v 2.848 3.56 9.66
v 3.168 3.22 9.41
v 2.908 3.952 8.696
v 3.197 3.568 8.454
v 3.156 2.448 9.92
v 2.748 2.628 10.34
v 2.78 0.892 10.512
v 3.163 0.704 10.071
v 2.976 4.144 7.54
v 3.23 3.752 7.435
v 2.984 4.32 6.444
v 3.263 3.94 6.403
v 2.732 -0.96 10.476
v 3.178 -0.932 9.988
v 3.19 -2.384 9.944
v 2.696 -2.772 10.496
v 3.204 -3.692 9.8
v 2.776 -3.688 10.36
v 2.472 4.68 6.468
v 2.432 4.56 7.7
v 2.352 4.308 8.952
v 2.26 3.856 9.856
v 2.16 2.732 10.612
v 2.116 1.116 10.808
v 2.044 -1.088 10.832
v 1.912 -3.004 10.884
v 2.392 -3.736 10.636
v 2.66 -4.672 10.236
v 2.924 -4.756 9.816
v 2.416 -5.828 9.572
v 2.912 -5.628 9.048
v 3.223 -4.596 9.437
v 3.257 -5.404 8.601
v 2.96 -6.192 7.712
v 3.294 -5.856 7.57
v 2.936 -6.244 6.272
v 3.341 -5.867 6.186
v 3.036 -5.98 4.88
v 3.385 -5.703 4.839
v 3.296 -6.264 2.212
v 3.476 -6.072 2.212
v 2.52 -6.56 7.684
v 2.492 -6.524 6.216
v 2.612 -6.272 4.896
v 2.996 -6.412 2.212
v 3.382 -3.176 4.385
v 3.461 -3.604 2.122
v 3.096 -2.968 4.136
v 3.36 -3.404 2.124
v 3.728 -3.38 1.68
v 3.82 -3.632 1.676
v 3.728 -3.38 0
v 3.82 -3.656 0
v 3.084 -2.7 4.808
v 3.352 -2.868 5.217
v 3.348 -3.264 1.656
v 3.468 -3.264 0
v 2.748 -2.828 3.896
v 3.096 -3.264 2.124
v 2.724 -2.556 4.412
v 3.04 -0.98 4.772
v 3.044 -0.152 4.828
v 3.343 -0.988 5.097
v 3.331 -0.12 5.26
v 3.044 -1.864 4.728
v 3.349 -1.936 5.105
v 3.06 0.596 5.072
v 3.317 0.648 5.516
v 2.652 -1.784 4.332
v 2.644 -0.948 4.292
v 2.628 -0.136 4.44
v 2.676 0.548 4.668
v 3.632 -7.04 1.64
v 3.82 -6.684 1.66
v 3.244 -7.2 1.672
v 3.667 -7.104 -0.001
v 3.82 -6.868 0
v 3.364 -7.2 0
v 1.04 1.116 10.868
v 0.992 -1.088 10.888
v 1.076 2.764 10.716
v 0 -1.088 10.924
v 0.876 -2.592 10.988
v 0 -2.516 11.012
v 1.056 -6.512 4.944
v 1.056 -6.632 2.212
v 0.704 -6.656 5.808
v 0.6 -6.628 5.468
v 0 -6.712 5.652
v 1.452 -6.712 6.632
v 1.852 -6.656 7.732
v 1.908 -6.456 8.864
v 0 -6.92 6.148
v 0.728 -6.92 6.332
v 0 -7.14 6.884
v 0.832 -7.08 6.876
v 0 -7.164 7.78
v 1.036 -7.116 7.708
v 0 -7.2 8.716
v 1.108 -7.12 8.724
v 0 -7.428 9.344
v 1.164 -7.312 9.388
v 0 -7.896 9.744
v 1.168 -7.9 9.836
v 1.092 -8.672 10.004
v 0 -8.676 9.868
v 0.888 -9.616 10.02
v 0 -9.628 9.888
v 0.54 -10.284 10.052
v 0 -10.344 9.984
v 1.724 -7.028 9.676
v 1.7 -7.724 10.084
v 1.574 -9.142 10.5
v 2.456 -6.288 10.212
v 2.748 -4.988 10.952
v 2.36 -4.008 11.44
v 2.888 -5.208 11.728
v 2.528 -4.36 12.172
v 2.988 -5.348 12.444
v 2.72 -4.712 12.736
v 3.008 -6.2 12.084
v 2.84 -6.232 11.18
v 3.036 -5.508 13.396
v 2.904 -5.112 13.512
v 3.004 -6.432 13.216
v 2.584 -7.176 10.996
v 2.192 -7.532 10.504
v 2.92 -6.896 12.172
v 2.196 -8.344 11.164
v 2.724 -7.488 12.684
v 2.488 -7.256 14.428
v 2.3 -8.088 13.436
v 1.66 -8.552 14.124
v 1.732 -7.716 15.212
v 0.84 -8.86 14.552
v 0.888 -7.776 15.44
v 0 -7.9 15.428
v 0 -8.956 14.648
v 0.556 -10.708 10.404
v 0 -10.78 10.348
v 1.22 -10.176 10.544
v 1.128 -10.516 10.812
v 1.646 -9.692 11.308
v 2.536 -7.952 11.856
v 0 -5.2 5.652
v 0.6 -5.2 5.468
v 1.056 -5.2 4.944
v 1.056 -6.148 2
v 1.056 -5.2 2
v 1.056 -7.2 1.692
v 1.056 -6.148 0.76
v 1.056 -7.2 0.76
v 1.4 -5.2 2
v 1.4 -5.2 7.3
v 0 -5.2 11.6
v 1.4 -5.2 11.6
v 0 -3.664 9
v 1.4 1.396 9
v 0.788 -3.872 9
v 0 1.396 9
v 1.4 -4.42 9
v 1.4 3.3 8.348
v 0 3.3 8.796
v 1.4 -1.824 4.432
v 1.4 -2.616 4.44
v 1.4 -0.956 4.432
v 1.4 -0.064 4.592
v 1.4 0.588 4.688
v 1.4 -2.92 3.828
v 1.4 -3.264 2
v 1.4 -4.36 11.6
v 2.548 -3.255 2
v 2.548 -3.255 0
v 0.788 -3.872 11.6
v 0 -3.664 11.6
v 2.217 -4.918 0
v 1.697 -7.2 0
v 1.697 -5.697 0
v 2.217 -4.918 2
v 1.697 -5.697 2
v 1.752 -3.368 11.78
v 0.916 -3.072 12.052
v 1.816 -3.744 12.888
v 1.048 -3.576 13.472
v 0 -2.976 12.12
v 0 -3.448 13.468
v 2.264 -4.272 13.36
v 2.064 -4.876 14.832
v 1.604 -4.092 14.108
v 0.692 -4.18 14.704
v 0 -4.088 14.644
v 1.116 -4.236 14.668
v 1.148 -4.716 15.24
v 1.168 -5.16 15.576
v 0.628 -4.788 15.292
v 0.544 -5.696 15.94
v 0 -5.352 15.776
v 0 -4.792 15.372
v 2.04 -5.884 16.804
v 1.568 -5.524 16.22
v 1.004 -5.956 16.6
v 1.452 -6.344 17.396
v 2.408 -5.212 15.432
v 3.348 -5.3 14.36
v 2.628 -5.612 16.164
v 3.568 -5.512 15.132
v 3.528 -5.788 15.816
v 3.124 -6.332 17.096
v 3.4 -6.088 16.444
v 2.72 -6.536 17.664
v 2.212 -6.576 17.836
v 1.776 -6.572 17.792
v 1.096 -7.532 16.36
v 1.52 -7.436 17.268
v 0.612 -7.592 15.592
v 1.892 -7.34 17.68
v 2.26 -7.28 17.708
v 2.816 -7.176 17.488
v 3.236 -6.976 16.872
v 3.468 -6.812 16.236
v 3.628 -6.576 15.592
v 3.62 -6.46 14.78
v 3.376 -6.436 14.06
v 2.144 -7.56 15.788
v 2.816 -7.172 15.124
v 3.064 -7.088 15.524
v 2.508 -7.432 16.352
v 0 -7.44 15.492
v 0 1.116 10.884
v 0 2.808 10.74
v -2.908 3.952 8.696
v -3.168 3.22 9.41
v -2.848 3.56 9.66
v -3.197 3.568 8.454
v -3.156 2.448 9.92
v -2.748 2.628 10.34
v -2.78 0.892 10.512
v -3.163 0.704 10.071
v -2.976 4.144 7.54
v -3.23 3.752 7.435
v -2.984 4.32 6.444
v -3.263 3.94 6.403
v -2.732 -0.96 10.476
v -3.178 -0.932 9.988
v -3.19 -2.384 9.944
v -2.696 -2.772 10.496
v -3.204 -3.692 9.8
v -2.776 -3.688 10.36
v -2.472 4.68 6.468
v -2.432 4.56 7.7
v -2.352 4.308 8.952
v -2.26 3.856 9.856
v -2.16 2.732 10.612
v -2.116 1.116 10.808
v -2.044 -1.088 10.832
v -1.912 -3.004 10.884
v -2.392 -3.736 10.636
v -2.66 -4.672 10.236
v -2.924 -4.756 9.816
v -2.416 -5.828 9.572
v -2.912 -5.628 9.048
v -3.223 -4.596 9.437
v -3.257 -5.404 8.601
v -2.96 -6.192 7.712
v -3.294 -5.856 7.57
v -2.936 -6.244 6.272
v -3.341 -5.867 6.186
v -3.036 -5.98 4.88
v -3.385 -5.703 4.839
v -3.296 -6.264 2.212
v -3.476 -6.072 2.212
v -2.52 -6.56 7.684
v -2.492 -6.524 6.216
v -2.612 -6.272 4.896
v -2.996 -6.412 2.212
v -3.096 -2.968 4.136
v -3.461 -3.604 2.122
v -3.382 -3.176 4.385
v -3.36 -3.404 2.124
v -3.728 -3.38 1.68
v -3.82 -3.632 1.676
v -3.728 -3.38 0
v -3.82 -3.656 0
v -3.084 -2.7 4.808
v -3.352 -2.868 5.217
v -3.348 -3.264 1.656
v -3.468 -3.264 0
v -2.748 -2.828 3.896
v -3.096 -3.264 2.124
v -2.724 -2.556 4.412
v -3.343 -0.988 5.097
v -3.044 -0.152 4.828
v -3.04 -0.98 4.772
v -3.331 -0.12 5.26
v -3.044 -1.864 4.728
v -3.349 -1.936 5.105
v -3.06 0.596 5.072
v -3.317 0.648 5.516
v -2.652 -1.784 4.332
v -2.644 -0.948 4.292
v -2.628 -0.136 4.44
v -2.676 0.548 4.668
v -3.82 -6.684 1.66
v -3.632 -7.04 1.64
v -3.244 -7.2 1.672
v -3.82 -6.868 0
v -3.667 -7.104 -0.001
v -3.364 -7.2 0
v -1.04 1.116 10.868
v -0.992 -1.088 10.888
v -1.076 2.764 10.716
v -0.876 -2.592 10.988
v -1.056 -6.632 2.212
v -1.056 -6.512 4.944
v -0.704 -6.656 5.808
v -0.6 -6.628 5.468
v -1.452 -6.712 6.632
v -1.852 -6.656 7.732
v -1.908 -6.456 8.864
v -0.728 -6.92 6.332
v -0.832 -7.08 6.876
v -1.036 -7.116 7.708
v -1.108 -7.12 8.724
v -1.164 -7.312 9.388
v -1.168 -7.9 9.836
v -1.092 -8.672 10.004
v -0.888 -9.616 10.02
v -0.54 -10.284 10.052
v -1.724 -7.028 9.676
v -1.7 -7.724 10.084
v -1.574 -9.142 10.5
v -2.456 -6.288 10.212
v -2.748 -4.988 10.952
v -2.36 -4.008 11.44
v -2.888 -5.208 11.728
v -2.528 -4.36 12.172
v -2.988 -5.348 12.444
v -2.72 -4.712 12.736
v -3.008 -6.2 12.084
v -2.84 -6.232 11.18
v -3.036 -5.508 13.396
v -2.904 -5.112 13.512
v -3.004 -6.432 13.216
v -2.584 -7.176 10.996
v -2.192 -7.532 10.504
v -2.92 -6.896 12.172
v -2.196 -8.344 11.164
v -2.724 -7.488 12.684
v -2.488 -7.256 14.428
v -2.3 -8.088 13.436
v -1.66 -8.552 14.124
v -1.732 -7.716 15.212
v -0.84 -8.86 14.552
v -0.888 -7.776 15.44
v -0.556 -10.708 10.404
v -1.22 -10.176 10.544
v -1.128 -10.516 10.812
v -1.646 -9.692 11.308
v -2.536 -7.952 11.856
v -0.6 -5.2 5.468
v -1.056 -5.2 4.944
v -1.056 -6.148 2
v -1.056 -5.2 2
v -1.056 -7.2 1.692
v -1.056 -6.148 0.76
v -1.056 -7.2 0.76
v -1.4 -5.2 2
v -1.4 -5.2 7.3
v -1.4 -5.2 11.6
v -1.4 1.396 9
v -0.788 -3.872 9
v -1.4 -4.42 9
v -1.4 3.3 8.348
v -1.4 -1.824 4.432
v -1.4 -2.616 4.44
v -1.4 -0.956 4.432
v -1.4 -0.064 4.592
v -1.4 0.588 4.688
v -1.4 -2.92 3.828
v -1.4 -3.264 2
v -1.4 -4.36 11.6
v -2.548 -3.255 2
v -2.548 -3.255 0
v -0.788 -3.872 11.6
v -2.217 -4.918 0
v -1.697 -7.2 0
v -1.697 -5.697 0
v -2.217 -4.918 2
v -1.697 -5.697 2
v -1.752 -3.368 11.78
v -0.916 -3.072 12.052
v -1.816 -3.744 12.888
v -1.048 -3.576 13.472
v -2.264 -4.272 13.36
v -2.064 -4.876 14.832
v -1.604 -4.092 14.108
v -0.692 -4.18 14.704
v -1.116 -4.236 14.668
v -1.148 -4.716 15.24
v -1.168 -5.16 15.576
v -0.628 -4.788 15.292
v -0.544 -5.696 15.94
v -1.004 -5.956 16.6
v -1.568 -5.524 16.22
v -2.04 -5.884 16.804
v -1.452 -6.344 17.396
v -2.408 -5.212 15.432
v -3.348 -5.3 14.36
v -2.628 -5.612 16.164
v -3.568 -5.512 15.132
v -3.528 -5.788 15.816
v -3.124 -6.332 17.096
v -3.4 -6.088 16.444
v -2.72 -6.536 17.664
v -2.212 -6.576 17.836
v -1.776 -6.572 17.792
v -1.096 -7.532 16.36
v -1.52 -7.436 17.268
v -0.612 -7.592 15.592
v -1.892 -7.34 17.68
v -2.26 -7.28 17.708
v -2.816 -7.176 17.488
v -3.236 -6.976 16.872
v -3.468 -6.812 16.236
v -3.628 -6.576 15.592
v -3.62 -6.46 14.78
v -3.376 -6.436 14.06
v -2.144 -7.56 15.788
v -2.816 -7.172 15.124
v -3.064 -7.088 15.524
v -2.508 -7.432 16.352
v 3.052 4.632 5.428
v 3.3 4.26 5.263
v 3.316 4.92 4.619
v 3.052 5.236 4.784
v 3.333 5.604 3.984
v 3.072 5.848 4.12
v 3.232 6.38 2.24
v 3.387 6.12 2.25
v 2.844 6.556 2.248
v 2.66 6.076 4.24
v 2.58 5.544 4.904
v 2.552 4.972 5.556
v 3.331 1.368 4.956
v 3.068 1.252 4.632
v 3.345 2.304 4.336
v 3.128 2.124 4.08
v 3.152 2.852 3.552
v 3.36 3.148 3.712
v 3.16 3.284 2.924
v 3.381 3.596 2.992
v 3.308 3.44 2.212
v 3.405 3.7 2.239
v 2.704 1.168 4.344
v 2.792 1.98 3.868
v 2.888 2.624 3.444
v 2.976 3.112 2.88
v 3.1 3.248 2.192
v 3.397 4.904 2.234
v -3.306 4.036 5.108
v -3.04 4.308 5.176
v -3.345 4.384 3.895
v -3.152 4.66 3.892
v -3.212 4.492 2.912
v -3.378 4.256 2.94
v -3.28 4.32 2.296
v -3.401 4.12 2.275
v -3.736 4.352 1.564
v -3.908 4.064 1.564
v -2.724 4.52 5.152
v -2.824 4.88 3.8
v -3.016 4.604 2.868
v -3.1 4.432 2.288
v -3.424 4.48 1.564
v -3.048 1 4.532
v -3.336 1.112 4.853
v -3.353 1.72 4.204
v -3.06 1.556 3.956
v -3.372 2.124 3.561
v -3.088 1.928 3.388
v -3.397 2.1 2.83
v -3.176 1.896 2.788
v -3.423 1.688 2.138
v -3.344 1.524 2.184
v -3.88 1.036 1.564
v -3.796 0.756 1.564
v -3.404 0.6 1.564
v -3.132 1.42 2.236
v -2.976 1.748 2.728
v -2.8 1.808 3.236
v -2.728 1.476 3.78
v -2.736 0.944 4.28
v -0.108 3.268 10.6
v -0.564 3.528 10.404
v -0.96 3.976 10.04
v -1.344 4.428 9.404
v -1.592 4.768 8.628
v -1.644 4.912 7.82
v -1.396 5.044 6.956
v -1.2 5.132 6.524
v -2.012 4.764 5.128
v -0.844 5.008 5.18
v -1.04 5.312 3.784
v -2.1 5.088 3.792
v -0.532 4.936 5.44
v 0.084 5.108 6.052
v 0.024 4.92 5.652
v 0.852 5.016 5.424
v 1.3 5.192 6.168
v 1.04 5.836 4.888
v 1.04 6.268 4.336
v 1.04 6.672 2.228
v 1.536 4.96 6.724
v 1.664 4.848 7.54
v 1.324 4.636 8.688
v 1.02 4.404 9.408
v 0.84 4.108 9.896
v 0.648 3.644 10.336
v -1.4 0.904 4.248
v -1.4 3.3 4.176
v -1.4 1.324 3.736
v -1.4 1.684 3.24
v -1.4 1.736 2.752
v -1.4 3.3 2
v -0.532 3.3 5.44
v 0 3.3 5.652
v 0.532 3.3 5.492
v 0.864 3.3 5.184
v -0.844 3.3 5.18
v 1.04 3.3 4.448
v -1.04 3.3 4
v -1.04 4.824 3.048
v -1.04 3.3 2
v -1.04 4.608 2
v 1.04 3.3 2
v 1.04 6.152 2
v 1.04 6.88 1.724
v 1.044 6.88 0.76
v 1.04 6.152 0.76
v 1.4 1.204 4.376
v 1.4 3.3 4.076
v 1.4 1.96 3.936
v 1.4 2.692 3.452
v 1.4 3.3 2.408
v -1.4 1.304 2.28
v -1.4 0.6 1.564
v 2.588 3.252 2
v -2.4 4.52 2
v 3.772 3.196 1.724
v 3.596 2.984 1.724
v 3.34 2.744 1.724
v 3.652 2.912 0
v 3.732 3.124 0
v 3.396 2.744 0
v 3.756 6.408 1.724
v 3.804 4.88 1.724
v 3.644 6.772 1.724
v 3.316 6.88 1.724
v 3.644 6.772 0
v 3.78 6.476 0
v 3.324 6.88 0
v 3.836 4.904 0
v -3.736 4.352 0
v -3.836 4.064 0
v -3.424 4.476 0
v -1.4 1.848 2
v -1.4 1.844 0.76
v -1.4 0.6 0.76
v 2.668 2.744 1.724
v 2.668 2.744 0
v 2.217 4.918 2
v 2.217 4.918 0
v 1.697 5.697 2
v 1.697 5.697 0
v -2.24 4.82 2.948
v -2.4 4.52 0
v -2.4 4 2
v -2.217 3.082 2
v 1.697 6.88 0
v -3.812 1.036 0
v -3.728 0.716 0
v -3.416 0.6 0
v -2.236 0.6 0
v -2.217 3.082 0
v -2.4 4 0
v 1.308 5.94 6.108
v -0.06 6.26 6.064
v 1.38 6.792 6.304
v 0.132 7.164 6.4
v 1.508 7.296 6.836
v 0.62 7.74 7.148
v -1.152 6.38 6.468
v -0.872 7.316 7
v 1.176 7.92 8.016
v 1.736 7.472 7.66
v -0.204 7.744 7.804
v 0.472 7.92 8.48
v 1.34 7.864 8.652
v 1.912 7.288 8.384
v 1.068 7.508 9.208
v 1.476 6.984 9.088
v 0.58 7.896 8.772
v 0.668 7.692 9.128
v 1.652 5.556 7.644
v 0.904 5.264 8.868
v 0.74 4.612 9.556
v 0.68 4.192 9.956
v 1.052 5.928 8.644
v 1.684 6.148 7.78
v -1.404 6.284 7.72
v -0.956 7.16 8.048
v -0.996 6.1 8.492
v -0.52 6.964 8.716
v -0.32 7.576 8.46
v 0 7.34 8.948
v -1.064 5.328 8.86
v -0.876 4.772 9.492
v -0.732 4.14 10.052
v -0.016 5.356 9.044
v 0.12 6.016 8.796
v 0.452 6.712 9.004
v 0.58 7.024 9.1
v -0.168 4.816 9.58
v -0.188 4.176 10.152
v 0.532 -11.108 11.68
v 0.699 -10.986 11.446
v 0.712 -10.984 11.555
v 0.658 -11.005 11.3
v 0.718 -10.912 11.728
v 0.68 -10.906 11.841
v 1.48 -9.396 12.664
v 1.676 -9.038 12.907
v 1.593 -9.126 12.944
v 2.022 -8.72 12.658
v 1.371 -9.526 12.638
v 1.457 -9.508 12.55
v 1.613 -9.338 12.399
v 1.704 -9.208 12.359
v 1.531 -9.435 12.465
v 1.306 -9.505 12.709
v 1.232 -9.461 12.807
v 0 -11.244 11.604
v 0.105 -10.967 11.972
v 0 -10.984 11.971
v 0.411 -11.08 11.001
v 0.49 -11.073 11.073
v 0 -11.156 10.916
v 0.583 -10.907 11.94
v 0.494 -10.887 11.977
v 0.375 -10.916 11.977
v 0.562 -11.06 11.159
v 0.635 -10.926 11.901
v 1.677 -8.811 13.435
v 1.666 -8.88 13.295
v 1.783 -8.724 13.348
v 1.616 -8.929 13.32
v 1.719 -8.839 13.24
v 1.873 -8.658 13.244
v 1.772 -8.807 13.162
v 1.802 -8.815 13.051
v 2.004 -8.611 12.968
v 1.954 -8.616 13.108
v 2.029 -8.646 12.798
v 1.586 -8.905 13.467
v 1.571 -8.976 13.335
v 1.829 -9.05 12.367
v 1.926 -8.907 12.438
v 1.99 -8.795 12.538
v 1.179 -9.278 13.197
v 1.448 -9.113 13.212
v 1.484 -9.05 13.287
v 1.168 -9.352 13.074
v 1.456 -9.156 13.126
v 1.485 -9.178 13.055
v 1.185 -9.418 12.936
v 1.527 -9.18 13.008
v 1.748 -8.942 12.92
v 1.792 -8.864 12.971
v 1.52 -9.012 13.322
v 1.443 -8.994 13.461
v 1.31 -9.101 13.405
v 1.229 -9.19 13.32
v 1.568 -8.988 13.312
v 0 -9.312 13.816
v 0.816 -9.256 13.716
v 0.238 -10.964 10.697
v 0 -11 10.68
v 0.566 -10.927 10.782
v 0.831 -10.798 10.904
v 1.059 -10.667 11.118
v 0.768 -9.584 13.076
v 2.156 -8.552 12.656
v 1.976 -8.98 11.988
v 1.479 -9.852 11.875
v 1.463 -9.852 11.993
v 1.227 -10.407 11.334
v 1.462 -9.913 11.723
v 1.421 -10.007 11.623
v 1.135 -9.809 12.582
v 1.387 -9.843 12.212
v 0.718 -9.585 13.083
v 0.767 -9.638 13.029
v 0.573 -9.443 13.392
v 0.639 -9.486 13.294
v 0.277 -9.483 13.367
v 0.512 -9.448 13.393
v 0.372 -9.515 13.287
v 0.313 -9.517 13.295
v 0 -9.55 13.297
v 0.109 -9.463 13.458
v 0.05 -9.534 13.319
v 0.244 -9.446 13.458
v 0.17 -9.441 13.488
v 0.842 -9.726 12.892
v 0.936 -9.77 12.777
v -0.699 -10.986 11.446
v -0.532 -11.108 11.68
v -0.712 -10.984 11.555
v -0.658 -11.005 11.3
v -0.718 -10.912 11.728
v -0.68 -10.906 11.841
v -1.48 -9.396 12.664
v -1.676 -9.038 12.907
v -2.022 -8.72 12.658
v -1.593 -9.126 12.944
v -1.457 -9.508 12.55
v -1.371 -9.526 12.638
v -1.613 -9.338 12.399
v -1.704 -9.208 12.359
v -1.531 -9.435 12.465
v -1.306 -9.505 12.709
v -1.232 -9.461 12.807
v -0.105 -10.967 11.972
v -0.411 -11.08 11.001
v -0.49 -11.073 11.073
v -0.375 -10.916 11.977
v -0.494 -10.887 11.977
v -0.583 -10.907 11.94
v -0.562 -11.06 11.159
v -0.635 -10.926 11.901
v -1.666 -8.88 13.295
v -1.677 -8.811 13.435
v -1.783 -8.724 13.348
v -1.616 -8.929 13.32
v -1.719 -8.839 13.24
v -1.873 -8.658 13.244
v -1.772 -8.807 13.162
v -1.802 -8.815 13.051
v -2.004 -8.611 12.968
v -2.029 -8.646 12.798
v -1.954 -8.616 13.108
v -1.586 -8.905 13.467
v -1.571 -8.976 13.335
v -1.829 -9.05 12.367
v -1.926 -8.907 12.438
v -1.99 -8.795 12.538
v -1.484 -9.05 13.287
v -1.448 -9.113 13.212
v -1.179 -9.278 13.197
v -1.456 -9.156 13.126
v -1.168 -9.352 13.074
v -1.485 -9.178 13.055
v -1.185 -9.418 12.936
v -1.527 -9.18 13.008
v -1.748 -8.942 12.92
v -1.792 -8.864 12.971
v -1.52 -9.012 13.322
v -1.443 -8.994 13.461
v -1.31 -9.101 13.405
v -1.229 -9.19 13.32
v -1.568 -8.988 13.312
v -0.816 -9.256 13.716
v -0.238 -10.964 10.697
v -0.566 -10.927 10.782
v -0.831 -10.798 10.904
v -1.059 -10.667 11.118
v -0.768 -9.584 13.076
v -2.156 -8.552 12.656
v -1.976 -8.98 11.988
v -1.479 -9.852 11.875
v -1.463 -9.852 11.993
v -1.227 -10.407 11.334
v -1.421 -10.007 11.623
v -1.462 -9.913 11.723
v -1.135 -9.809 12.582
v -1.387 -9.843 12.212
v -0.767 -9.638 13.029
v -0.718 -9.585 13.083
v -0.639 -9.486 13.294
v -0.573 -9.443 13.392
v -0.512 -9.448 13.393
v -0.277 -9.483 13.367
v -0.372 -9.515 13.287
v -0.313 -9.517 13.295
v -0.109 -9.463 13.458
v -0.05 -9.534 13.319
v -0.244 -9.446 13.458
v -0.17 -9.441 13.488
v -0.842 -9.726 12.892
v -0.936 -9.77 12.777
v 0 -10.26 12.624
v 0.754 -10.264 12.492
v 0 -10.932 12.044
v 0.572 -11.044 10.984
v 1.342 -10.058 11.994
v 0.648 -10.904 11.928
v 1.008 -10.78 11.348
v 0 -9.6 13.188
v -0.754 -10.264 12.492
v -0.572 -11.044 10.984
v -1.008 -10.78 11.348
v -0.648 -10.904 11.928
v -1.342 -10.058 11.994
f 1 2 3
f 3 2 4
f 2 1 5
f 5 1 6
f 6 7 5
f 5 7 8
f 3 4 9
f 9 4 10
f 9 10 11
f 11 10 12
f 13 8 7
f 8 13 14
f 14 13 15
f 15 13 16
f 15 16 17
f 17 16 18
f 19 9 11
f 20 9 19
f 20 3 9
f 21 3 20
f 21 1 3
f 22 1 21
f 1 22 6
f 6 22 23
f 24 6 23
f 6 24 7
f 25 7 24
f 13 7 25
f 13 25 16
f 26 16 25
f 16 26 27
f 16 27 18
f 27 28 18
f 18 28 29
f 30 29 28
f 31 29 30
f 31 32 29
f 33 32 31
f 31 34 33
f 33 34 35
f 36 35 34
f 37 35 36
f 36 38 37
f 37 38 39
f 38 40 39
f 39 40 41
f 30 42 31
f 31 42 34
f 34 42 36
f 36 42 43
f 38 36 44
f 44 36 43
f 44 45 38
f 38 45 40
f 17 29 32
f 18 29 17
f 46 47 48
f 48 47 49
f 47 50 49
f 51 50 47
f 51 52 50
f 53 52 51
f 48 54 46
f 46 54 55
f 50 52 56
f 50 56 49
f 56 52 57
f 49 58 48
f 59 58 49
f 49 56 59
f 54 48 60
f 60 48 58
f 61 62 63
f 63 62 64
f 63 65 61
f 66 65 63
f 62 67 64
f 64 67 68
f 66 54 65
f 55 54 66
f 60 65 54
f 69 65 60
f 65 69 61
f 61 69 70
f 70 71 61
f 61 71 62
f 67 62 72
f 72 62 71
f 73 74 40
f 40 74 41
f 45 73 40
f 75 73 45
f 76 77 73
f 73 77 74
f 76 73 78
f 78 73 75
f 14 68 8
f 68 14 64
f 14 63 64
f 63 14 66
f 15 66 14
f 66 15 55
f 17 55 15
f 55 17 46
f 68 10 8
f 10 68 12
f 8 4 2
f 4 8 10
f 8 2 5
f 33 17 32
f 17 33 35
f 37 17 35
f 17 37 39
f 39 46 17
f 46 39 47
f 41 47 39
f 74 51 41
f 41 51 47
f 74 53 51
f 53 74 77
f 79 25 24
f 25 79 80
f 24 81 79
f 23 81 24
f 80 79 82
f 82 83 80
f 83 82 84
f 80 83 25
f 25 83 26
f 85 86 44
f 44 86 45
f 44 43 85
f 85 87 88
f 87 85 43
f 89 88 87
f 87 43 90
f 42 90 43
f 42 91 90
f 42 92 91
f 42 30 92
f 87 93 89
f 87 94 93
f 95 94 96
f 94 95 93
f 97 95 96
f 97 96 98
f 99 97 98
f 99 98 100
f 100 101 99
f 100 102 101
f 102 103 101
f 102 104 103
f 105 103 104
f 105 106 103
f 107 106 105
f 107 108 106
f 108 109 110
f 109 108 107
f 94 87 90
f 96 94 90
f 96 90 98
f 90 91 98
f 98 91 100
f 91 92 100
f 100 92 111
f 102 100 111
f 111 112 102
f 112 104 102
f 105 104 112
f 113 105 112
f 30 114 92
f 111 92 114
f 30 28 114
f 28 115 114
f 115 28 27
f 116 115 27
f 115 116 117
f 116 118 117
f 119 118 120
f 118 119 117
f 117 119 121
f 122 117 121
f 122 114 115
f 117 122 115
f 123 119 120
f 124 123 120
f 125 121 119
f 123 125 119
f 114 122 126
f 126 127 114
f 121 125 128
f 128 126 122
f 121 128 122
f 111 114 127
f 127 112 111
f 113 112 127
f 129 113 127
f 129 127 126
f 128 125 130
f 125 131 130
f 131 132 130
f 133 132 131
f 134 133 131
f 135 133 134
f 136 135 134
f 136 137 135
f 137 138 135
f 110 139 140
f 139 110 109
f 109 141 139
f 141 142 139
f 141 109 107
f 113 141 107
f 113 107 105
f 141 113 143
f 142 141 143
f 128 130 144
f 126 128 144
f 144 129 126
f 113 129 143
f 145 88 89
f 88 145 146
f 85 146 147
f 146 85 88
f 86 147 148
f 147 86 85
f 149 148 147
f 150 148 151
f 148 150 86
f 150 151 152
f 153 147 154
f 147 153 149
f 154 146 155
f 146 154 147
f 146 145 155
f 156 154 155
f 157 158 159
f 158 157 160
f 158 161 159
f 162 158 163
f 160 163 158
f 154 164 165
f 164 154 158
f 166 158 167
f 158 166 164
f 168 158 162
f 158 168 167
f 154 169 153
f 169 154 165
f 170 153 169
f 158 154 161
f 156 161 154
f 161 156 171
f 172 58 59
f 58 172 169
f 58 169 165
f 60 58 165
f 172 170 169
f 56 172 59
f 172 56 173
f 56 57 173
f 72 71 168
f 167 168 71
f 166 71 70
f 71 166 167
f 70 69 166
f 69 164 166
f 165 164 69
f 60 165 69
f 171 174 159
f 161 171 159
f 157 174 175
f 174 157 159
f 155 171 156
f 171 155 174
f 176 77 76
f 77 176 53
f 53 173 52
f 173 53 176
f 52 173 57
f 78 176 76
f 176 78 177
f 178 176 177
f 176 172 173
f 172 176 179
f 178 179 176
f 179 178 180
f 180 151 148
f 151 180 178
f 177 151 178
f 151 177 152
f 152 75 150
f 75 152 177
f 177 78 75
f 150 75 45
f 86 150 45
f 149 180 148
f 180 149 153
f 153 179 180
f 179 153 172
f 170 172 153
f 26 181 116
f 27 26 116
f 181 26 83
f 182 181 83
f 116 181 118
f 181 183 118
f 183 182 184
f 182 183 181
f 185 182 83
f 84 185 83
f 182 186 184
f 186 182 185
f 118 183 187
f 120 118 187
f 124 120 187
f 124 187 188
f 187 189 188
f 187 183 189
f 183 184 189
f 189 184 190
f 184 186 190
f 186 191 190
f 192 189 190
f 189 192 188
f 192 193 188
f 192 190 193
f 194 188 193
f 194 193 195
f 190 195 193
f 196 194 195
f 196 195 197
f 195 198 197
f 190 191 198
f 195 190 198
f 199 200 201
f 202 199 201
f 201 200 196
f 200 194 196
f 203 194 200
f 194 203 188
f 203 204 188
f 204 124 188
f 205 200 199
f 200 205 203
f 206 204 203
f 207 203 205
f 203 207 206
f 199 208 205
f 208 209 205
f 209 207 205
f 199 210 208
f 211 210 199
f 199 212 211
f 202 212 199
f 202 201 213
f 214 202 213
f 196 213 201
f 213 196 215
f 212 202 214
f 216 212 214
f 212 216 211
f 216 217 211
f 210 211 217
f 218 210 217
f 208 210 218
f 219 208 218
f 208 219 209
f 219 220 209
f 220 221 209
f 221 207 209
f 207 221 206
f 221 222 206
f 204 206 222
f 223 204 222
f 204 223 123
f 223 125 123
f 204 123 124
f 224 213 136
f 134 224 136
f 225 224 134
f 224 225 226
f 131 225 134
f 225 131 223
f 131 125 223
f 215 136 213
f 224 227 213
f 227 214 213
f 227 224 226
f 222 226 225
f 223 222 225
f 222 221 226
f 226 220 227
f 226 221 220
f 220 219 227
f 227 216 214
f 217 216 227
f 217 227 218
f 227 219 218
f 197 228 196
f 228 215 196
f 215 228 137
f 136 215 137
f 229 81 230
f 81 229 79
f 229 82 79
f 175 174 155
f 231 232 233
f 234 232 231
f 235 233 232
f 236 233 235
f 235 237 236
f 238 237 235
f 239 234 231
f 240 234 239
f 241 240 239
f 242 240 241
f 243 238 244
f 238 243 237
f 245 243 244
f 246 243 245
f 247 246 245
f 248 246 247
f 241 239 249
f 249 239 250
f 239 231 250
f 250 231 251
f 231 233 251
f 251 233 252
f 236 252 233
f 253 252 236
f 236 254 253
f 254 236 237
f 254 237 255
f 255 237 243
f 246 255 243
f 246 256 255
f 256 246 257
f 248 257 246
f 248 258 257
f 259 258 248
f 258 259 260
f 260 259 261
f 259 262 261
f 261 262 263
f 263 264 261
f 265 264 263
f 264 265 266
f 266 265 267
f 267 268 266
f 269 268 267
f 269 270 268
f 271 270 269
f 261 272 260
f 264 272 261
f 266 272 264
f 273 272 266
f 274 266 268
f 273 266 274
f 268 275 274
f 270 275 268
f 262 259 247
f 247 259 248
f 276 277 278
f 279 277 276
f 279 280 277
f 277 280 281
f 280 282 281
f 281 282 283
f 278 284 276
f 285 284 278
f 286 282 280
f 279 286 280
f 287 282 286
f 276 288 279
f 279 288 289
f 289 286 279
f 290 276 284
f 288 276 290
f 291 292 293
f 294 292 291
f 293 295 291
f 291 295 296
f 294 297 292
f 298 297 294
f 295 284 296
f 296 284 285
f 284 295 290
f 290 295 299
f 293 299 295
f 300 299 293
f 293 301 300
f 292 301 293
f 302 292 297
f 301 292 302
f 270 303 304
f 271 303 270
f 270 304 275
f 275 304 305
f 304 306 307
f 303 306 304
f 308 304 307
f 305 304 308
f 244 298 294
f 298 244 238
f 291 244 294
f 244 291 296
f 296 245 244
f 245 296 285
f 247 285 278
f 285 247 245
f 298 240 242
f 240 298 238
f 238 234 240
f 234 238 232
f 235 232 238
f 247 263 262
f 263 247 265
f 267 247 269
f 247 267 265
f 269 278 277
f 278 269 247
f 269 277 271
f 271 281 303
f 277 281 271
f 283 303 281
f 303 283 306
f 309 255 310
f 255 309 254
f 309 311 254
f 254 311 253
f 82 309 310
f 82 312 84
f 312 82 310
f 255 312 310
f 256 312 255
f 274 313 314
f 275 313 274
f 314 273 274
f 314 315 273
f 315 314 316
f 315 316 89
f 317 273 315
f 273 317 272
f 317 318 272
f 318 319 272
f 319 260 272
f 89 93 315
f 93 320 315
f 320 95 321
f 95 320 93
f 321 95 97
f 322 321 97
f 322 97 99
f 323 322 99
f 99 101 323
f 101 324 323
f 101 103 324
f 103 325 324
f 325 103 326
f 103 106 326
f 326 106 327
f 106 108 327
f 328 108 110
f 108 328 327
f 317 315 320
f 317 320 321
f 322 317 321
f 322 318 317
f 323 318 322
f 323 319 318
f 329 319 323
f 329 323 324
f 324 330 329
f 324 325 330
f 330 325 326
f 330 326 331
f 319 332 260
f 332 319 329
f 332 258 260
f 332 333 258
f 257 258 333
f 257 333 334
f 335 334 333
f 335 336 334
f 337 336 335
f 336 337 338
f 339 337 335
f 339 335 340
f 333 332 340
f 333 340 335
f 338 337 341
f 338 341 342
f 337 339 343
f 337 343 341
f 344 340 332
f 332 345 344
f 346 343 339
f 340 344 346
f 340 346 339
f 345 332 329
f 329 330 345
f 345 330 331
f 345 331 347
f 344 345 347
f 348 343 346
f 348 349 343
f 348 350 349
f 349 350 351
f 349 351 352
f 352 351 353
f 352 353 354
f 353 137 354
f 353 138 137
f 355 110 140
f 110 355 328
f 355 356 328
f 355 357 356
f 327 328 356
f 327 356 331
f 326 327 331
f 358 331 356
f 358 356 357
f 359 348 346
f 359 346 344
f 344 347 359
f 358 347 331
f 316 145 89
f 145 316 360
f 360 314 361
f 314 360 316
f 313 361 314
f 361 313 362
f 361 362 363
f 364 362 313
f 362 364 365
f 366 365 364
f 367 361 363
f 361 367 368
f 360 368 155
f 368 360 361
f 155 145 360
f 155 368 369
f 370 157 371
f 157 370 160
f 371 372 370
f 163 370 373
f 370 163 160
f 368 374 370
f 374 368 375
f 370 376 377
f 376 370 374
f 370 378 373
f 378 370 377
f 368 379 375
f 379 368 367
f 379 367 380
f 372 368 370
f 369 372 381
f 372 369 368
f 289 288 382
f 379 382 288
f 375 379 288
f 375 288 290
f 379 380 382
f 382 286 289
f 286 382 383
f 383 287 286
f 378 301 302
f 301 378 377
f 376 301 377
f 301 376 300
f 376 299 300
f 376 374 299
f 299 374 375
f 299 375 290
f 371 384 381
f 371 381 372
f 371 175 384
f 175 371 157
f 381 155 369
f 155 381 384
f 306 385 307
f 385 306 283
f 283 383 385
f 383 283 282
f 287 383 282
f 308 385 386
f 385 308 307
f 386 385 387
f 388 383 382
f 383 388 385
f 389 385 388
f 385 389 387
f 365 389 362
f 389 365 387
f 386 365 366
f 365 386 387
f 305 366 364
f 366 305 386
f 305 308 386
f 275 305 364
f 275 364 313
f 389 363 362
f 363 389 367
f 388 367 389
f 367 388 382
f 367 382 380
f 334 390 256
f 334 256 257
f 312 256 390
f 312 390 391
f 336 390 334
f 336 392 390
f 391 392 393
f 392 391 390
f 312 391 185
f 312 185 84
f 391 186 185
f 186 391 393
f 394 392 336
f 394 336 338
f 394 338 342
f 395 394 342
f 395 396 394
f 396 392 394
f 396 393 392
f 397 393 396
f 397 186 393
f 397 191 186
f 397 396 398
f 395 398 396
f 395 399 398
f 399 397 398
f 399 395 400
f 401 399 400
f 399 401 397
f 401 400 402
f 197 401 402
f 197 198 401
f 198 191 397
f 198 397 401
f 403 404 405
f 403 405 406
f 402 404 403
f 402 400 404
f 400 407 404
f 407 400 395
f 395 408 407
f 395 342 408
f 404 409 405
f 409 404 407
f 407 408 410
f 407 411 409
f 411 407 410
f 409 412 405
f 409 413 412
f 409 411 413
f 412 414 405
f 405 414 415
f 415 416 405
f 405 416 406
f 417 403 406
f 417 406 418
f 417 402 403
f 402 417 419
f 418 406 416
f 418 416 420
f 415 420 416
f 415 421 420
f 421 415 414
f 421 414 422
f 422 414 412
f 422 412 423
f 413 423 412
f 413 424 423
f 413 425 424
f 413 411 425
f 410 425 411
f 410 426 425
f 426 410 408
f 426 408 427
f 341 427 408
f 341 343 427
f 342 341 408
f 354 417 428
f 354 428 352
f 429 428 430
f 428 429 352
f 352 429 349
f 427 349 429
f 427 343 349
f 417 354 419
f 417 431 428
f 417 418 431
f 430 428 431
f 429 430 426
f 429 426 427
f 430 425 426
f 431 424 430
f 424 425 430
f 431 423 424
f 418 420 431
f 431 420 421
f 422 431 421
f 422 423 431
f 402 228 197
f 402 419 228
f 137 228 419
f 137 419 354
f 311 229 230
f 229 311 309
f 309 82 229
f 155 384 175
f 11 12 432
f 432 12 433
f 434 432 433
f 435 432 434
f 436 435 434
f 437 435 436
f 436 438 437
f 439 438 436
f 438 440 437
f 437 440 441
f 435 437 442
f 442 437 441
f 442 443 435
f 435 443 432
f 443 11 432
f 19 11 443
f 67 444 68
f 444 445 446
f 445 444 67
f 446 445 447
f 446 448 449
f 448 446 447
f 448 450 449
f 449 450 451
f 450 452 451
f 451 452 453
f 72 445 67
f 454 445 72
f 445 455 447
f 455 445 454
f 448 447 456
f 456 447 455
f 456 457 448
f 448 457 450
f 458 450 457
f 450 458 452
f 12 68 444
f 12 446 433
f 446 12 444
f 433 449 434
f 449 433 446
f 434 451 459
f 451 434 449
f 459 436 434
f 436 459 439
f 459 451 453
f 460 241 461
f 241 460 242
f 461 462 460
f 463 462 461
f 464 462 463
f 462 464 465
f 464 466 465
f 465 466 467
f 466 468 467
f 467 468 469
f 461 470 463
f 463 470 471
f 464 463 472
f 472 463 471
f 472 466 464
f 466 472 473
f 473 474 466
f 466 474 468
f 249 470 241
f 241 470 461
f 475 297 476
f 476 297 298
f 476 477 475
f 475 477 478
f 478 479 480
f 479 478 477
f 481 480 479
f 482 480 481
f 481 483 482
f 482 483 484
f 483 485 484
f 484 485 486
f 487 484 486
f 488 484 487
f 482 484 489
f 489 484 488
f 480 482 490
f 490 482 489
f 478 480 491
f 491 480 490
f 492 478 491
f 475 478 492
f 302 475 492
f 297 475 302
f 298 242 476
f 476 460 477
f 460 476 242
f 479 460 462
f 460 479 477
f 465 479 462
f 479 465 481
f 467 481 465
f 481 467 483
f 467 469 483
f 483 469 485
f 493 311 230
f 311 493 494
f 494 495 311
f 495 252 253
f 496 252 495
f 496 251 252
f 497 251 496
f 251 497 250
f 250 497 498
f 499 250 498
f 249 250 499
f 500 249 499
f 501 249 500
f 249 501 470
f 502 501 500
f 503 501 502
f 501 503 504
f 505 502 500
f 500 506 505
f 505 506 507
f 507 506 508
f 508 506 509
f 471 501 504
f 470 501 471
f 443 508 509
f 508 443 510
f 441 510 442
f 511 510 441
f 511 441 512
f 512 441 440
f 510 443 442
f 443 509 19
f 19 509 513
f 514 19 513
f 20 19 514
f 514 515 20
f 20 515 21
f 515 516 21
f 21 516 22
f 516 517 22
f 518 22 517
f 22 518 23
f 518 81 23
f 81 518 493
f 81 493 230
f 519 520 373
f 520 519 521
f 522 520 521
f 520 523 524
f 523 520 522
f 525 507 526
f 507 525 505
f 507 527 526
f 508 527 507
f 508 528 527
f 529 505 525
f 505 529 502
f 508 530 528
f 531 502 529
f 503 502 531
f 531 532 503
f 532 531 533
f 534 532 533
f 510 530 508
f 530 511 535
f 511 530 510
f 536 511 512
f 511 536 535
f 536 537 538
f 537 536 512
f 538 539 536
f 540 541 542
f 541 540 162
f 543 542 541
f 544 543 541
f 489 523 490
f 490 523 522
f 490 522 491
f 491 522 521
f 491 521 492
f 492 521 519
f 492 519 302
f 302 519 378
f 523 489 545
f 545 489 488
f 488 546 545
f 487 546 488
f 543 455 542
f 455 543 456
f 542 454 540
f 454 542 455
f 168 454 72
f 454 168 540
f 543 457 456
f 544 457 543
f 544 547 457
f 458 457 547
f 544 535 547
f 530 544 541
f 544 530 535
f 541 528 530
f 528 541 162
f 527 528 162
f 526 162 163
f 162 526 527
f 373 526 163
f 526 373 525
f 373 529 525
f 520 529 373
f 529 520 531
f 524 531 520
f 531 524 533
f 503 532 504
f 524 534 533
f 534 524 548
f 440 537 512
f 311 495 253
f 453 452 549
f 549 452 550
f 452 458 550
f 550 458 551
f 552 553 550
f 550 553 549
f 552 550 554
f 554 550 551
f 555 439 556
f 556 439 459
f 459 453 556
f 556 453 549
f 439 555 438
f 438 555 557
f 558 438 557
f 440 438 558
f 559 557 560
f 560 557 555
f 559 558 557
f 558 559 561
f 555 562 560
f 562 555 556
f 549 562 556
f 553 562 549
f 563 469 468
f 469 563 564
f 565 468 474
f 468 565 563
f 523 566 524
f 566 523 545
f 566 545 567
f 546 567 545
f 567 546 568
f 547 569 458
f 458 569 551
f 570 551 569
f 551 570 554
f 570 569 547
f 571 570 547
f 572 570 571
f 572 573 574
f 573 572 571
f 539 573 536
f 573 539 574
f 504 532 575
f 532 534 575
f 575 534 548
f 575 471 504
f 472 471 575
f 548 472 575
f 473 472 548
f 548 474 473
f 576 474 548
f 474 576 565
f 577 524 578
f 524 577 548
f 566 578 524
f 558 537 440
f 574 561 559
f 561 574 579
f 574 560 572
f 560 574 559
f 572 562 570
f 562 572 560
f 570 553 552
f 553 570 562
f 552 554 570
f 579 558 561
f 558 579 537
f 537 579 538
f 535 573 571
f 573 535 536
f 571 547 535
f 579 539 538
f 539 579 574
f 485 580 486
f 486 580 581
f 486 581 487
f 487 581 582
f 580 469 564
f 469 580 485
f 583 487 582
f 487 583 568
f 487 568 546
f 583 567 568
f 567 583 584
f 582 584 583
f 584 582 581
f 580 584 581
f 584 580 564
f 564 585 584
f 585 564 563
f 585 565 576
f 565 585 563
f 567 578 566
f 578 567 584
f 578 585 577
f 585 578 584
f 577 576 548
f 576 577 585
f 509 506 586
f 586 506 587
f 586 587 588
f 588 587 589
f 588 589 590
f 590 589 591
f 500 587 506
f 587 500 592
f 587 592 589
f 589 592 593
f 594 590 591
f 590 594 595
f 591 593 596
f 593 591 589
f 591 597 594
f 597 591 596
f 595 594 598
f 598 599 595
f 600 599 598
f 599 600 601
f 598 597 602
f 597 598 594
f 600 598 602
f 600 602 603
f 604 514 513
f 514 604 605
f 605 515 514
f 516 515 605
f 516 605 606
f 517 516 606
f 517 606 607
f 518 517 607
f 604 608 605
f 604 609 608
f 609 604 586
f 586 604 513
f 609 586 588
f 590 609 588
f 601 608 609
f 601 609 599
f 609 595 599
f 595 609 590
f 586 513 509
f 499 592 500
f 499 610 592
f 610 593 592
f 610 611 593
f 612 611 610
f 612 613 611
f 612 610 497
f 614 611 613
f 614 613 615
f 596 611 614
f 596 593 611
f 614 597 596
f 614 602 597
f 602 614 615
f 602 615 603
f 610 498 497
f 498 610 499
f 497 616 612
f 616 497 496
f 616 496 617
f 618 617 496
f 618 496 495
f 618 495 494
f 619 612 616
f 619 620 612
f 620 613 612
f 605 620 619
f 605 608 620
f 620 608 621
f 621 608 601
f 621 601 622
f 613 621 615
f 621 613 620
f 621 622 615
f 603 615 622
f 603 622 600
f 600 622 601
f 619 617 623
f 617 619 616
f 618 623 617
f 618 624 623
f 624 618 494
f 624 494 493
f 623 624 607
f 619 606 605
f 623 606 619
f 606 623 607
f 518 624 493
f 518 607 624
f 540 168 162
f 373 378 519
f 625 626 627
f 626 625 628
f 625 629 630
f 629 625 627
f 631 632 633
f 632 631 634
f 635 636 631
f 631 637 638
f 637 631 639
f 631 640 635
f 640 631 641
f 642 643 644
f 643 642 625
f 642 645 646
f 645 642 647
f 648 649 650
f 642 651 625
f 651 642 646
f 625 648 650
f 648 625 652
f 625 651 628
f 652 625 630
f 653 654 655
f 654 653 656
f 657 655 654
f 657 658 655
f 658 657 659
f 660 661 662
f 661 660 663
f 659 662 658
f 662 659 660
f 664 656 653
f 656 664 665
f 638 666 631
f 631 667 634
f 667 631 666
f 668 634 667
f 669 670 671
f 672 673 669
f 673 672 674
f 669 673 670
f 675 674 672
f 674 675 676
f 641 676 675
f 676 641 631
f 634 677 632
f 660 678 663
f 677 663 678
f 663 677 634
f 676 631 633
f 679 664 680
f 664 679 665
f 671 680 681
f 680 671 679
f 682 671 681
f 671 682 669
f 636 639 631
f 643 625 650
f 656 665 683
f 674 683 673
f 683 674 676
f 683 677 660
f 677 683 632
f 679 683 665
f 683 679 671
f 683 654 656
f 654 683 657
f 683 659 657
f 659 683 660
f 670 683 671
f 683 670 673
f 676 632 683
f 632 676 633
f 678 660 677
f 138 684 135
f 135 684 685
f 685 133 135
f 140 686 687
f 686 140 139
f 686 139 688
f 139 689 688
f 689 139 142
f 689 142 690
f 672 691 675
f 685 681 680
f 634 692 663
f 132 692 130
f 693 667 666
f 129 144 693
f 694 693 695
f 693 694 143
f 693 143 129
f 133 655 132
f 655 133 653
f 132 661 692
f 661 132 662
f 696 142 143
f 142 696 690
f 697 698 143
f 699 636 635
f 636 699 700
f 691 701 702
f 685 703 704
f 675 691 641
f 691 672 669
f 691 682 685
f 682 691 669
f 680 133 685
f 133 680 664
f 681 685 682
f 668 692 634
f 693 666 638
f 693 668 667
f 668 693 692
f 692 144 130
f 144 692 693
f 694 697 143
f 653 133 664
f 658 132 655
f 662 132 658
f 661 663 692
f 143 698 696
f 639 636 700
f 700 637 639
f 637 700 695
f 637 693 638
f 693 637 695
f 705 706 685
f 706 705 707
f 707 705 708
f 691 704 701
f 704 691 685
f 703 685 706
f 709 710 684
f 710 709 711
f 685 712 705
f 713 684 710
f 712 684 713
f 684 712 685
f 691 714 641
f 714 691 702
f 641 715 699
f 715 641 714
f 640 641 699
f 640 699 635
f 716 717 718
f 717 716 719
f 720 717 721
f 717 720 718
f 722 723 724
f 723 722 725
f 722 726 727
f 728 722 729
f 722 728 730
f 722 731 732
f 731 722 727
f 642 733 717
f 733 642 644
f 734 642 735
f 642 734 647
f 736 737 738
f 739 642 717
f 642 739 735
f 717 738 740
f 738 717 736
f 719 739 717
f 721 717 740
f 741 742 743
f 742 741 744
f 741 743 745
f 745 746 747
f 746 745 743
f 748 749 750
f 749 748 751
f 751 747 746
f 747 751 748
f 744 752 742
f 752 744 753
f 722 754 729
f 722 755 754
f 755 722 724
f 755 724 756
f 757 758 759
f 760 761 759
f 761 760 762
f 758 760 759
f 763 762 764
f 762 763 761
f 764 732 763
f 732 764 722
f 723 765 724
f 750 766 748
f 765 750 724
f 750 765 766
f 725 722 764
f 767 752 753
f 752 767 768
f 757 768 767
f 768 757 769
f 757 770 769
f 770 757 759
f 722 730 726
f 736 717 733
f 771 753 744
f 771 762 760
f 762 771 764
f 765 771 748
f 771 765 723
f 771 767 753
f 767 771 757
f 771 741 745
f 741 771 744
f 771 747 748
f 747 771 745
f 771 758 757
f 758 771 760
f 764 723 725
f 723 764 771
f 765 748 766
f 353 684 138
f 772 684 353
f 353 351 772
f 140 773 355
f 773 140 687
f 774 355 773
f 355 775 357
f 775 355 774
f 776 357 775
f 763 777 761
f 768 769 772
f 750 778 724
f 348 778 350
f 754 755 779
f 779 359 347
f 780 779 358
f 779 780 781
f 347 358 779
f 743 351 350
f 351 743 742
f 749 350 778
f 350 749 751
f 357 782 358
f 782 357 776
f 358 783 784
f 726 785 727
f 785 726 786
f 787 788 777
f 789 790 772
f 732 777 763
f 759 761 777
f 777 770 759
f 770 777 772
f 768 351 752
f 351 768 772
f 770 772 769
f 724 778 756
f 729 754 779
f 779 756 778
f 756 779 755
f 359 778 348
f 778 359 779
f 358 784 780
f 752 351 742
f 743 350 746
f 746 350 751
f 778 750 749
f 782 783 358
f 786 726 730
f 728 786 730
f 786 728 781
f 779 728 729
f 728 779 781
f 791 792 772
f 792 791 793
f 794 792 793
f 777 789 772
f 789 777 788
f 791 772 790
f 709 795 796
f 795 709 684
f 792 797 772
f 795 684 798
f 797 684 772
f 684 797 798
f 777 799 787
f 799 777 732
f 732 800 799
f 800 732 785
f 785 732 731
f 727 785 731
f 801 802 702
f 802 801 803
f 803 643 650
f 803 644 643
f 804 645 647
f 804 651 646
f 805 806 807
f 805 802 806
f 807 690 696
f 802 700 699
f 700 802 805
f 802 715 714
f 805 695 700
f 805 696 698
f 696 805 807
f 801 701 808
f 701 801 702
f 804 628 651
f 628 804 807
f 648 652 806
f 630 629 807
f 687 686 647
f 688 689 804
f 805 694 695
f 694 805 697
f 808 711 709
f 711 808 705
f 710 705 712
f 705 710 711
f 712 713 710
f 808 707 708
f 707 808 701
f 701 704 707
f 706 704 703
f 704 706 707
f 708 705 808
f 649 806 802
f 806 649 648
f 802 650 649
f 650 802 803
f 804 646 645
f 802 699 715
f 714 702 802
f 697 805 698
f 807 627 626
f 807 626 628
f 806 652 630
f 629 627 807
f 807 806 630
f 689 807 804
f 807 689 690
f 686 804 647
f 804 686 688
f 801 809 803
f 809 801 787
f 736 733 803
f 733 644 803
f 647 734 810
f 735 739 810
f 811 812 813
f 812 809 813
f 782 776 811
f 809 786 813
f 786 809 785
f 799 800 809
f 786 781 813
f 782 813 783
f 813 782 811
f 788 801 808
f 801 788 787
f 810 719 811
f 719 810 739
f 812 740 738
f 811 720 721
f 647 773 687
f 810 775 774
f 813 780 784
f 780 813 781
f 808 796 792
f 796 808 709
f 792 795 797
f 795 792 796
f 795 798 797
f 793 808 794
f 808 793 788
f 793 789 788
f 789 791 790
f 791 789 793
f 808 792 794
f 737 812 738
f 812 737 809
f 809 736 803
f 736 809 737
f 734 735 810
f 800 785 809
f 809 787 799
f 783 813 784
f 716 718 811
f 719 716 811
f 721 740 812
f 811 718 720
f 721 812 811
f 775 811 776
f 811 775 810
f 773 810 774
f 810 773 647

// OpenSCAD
use <../lib.scad>
use <s/2889p01s01.scad>
use <s/2889p01s02.scad>
use <s/2889s01.scad>
function ldraw_lib__2889p01() = [
// 0 Animal Dog Alsatian / German Shepherd Puppy with Black Eyes and Nose and Dark Brown Muzzle Pattern
// 0 Name: 2889p01.dat
// 0 Author: Philippe Hurbain [Philo]
// 0 !LDRAW_ORG Part UPDATE 2026-03
// 0 !LICENSE Licensed under CC BY 4.0 : see CAreadme.txt
// 
// 0 BFC CERTIFY CCW
  [0,"BFC","CERTIFY"],
  [0,"BFC","CCW"],
// 
// 0 !KEYWORDS Bricklink 2889pb01, Brickowl 383466, Brickset 101352
// 0 !KEYWORDS Rebrickable 02889pr0001, Set 21353, set 60369, set 60398, Set 60461
// 0 !KEYWORDS Set 60472
// 
// 0 !HISTORY 2026-03-31 [OrionP] Official Update 2026-03
// 
// 1 16 0 0 0 1 0 0 0 1 0 0 0 1 s\2889s01.dat
  [1,16,0,0,0,1,0,0,0,1,0,0,0,1, ldraw_lib__s__2889s01()],
// 1 16 0 0 0 1 0 0 0 1 0 0 0 1 s\2889p01s01.dat
  [1,16,0,0,0,1,0,0,0,1,0,0,0,1, ldraw_lib__s__2889p01s01()],
// 1 16 0 0 0 -1 0 0 0 1 0 0 0 1 s\2889p01s01.dat
  [1,16,0,0,0,-1,0,0,0,1,0,0,0,1, ldraw_lib__s__2889p01s01()],
// 1 308 0 0 0 1 0 0 0 1 0 0 0 1 s\2889p01s02.dat
  [1,308,0,0,0,1,0,0,0,1,0,0,0,1, ldraw_lib__s__2889p01s02()],
// 1 308 0 0 0 -1 0 0 0 1 0 0 0 1 s\2889p01s02.dat
  [1,308,0,0,0,-1,0,0,0,1,0,0,0,1, ldraw_lib__s__2889p01s02()],
];
module ldraw_lib__2889p01(step=0, col=false, unit=2/5, alt=false, line=0.2, solid=!$preview)
    makepoly(ldraw_lib__2889p01(), step=step, col=col, unit=unit, alt=alt, line=line, solid=solid);
ldraw_lib__2889p01(line=0.2);
